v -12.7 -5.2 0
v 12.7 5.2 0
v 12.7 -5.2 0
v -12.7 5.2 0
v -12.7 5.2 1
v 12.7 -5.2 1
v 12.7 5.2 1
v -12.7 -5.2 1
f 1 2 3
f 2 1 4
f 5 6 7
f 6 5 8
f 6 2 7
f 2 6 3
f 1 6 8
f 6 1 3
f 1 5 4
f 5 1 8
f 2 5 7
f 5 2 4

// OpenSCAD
// file: ../p/box.scad
use <../lib.scad>
function ldraw_lib__box() = [
// 0 Box 6 (six faces)
// 0 Name: box.dat
// 0 Author: James Jessiman
// 0 !LDRAW_ORG Primitive UPDATE 2002-05
// 0 !LICENSE Licensed under CC BY 4.0 : see CAreadme.txt
// 
// 0 BFC CERTIFY CCW
  [0,"BFC","CERTIFY"],
  [0,"BFC","CCW"],
// 
// 0 !HISTORY 2002-08-22 [sbliss] Applied BFC
// 0 !HISTORY 2002-11-30 [PTadmin] Official Update 2002-05
// 0 !HISTORY 2007-06-24 [PTadmin] Header formatted for Contributor Agreement
// 0 !HISTORY 2008-07-01 [PTadmin] Official Update 2008-01
// 
// 
// 2 24 1 1 1 -1 1 1
  [2,24,1,1,1,-1,1,1],
// 2 24 -1 1 1 -1 1 -1
  [2,24,-1,1,1,-1,1,-1],
// 2 24 -1 1 -1 1 1 -1
  [2,24,-1,1,-1,1,1,-1],
// 2 24 1 1 -1 1 1 1
  [2,24,1,1,-1,1,1,1],
// 2 24 1 -1 1 -1 -1 1
  [2,24,1,-1,1,-1,-1,1],
// 2 24 -1 -1 1 -1 -1 -1
  [2,24,-1,-1,1,-1,-1,-1],
// 2 24 -1 -1 -1 1 -1 -1
  [2,24,-1,-1,-1,1,-1,-1],
// 2 24 1 -1 -1 1 -1 1
  [2,24,1,-1,-1,1,-1,1],
// 2 24 1 -1 1 1 1 1
  [2,24,1,-1,1,1,1,1],
// 2 24 -1 -1 1 -1 1 1
  [2,24,-1,-1,1,-1,1,1],
// 2 24 1 -1 -1 1 1 -1
  [2,24,1,-1,-1,1,1,-1],
// 2 24 -1 -1 -1 -1 1 -1
  [2,24,-1,-1,-1,-1,1,-1],
// 4 16 1 1 1 1 1 -1 -1 1 -1 -1 1 1
  [4,16,1,1,1,1,1,-1,-1,1,-1,-1,1,1],
// 4 16 -1 -1 -1 1 -1 -1 1 -1 1 -1 -1 1
  [4,16,-1,-1,-1,1,-1,-1,1,-1,1,-1,-1,1],
// 4 16 -1 -1 1 1 -1 1 1 1 1 -1 1 1
  [4,16,-1,-1,1,1,-1,1,1,1,1,-1,1,1],
// 4 16 -1 -1 -1 -1 -1 1 -1 1 1 -1 1 -1
  [4,16,-1,-1,-1,-1,-1,1,-1,1,1,-1,1,-1],
// 4 16 1 -1 -1 -1 -1 -1 -1 1 -1 1 1 -1
  [4,16,1,-1,-1,-1,-1,-1,-1,1,-1,1,1,-1],
// 4 16 1 -1 1 1 -1 -1 1 1 -1 1 1 1
  [4,16,1,-1,1,1,-1,-1,1,1,-1,1,1,1],
// 0
];
module ldraw_lib__box(step=0, col=false, unit=2/5, alt=false, line=0.2, solid=!$preview)
    makepoly(ldraw_lib__box(), step=step, col=col, unit=unit, alt=alt, line=line, solid=solid);
ldraw_lib__box(line=0.2);
// main file
use <../lib.scad>
use <../p/box.scad>
function ldraw_lib__t1103() = [
// 0 ~| Circuit Cubes High Speed Motor Bottom Plate
// 0 Name: t1103.dat
// 0 Author: Philippe Hurbain [Philo]
// 0 !LDRAW_ORG Part UPDATE 2022-05
// 0 !LICENSE Licensed under CC BY 4.0 : see CAreadme.txt
// 
// 0 BFC CERTIFY CCW
  [0,"BFC","CERTIFY"],
  [0,"BFC","CCW"],
// 
// 0 !CATEGORY Electric
// 
// 0 !HISTORY 2022-09-15 [PTadmin] Official Update 2022-05
// 
// 
// 1 16 0 -1.25 0 0 0 31.75 0 1.25 0 13 0 0 box.dat
  [1,16,0,-1.25,0,0,0,31.75,0,1.25,0,13,0,0, ldraw_lib__box()],
];
module ldraw_lib__t1103(step=0, col=false, unit=2/5, alt=false, line=0.2, solid=!$preview)
    makepoly(ldraw_lib__t1103(), step=step, col=col, unit=unit, alt=alt, line=line, solid=solid);
ldraw_lib__t1103(line=0.2);
